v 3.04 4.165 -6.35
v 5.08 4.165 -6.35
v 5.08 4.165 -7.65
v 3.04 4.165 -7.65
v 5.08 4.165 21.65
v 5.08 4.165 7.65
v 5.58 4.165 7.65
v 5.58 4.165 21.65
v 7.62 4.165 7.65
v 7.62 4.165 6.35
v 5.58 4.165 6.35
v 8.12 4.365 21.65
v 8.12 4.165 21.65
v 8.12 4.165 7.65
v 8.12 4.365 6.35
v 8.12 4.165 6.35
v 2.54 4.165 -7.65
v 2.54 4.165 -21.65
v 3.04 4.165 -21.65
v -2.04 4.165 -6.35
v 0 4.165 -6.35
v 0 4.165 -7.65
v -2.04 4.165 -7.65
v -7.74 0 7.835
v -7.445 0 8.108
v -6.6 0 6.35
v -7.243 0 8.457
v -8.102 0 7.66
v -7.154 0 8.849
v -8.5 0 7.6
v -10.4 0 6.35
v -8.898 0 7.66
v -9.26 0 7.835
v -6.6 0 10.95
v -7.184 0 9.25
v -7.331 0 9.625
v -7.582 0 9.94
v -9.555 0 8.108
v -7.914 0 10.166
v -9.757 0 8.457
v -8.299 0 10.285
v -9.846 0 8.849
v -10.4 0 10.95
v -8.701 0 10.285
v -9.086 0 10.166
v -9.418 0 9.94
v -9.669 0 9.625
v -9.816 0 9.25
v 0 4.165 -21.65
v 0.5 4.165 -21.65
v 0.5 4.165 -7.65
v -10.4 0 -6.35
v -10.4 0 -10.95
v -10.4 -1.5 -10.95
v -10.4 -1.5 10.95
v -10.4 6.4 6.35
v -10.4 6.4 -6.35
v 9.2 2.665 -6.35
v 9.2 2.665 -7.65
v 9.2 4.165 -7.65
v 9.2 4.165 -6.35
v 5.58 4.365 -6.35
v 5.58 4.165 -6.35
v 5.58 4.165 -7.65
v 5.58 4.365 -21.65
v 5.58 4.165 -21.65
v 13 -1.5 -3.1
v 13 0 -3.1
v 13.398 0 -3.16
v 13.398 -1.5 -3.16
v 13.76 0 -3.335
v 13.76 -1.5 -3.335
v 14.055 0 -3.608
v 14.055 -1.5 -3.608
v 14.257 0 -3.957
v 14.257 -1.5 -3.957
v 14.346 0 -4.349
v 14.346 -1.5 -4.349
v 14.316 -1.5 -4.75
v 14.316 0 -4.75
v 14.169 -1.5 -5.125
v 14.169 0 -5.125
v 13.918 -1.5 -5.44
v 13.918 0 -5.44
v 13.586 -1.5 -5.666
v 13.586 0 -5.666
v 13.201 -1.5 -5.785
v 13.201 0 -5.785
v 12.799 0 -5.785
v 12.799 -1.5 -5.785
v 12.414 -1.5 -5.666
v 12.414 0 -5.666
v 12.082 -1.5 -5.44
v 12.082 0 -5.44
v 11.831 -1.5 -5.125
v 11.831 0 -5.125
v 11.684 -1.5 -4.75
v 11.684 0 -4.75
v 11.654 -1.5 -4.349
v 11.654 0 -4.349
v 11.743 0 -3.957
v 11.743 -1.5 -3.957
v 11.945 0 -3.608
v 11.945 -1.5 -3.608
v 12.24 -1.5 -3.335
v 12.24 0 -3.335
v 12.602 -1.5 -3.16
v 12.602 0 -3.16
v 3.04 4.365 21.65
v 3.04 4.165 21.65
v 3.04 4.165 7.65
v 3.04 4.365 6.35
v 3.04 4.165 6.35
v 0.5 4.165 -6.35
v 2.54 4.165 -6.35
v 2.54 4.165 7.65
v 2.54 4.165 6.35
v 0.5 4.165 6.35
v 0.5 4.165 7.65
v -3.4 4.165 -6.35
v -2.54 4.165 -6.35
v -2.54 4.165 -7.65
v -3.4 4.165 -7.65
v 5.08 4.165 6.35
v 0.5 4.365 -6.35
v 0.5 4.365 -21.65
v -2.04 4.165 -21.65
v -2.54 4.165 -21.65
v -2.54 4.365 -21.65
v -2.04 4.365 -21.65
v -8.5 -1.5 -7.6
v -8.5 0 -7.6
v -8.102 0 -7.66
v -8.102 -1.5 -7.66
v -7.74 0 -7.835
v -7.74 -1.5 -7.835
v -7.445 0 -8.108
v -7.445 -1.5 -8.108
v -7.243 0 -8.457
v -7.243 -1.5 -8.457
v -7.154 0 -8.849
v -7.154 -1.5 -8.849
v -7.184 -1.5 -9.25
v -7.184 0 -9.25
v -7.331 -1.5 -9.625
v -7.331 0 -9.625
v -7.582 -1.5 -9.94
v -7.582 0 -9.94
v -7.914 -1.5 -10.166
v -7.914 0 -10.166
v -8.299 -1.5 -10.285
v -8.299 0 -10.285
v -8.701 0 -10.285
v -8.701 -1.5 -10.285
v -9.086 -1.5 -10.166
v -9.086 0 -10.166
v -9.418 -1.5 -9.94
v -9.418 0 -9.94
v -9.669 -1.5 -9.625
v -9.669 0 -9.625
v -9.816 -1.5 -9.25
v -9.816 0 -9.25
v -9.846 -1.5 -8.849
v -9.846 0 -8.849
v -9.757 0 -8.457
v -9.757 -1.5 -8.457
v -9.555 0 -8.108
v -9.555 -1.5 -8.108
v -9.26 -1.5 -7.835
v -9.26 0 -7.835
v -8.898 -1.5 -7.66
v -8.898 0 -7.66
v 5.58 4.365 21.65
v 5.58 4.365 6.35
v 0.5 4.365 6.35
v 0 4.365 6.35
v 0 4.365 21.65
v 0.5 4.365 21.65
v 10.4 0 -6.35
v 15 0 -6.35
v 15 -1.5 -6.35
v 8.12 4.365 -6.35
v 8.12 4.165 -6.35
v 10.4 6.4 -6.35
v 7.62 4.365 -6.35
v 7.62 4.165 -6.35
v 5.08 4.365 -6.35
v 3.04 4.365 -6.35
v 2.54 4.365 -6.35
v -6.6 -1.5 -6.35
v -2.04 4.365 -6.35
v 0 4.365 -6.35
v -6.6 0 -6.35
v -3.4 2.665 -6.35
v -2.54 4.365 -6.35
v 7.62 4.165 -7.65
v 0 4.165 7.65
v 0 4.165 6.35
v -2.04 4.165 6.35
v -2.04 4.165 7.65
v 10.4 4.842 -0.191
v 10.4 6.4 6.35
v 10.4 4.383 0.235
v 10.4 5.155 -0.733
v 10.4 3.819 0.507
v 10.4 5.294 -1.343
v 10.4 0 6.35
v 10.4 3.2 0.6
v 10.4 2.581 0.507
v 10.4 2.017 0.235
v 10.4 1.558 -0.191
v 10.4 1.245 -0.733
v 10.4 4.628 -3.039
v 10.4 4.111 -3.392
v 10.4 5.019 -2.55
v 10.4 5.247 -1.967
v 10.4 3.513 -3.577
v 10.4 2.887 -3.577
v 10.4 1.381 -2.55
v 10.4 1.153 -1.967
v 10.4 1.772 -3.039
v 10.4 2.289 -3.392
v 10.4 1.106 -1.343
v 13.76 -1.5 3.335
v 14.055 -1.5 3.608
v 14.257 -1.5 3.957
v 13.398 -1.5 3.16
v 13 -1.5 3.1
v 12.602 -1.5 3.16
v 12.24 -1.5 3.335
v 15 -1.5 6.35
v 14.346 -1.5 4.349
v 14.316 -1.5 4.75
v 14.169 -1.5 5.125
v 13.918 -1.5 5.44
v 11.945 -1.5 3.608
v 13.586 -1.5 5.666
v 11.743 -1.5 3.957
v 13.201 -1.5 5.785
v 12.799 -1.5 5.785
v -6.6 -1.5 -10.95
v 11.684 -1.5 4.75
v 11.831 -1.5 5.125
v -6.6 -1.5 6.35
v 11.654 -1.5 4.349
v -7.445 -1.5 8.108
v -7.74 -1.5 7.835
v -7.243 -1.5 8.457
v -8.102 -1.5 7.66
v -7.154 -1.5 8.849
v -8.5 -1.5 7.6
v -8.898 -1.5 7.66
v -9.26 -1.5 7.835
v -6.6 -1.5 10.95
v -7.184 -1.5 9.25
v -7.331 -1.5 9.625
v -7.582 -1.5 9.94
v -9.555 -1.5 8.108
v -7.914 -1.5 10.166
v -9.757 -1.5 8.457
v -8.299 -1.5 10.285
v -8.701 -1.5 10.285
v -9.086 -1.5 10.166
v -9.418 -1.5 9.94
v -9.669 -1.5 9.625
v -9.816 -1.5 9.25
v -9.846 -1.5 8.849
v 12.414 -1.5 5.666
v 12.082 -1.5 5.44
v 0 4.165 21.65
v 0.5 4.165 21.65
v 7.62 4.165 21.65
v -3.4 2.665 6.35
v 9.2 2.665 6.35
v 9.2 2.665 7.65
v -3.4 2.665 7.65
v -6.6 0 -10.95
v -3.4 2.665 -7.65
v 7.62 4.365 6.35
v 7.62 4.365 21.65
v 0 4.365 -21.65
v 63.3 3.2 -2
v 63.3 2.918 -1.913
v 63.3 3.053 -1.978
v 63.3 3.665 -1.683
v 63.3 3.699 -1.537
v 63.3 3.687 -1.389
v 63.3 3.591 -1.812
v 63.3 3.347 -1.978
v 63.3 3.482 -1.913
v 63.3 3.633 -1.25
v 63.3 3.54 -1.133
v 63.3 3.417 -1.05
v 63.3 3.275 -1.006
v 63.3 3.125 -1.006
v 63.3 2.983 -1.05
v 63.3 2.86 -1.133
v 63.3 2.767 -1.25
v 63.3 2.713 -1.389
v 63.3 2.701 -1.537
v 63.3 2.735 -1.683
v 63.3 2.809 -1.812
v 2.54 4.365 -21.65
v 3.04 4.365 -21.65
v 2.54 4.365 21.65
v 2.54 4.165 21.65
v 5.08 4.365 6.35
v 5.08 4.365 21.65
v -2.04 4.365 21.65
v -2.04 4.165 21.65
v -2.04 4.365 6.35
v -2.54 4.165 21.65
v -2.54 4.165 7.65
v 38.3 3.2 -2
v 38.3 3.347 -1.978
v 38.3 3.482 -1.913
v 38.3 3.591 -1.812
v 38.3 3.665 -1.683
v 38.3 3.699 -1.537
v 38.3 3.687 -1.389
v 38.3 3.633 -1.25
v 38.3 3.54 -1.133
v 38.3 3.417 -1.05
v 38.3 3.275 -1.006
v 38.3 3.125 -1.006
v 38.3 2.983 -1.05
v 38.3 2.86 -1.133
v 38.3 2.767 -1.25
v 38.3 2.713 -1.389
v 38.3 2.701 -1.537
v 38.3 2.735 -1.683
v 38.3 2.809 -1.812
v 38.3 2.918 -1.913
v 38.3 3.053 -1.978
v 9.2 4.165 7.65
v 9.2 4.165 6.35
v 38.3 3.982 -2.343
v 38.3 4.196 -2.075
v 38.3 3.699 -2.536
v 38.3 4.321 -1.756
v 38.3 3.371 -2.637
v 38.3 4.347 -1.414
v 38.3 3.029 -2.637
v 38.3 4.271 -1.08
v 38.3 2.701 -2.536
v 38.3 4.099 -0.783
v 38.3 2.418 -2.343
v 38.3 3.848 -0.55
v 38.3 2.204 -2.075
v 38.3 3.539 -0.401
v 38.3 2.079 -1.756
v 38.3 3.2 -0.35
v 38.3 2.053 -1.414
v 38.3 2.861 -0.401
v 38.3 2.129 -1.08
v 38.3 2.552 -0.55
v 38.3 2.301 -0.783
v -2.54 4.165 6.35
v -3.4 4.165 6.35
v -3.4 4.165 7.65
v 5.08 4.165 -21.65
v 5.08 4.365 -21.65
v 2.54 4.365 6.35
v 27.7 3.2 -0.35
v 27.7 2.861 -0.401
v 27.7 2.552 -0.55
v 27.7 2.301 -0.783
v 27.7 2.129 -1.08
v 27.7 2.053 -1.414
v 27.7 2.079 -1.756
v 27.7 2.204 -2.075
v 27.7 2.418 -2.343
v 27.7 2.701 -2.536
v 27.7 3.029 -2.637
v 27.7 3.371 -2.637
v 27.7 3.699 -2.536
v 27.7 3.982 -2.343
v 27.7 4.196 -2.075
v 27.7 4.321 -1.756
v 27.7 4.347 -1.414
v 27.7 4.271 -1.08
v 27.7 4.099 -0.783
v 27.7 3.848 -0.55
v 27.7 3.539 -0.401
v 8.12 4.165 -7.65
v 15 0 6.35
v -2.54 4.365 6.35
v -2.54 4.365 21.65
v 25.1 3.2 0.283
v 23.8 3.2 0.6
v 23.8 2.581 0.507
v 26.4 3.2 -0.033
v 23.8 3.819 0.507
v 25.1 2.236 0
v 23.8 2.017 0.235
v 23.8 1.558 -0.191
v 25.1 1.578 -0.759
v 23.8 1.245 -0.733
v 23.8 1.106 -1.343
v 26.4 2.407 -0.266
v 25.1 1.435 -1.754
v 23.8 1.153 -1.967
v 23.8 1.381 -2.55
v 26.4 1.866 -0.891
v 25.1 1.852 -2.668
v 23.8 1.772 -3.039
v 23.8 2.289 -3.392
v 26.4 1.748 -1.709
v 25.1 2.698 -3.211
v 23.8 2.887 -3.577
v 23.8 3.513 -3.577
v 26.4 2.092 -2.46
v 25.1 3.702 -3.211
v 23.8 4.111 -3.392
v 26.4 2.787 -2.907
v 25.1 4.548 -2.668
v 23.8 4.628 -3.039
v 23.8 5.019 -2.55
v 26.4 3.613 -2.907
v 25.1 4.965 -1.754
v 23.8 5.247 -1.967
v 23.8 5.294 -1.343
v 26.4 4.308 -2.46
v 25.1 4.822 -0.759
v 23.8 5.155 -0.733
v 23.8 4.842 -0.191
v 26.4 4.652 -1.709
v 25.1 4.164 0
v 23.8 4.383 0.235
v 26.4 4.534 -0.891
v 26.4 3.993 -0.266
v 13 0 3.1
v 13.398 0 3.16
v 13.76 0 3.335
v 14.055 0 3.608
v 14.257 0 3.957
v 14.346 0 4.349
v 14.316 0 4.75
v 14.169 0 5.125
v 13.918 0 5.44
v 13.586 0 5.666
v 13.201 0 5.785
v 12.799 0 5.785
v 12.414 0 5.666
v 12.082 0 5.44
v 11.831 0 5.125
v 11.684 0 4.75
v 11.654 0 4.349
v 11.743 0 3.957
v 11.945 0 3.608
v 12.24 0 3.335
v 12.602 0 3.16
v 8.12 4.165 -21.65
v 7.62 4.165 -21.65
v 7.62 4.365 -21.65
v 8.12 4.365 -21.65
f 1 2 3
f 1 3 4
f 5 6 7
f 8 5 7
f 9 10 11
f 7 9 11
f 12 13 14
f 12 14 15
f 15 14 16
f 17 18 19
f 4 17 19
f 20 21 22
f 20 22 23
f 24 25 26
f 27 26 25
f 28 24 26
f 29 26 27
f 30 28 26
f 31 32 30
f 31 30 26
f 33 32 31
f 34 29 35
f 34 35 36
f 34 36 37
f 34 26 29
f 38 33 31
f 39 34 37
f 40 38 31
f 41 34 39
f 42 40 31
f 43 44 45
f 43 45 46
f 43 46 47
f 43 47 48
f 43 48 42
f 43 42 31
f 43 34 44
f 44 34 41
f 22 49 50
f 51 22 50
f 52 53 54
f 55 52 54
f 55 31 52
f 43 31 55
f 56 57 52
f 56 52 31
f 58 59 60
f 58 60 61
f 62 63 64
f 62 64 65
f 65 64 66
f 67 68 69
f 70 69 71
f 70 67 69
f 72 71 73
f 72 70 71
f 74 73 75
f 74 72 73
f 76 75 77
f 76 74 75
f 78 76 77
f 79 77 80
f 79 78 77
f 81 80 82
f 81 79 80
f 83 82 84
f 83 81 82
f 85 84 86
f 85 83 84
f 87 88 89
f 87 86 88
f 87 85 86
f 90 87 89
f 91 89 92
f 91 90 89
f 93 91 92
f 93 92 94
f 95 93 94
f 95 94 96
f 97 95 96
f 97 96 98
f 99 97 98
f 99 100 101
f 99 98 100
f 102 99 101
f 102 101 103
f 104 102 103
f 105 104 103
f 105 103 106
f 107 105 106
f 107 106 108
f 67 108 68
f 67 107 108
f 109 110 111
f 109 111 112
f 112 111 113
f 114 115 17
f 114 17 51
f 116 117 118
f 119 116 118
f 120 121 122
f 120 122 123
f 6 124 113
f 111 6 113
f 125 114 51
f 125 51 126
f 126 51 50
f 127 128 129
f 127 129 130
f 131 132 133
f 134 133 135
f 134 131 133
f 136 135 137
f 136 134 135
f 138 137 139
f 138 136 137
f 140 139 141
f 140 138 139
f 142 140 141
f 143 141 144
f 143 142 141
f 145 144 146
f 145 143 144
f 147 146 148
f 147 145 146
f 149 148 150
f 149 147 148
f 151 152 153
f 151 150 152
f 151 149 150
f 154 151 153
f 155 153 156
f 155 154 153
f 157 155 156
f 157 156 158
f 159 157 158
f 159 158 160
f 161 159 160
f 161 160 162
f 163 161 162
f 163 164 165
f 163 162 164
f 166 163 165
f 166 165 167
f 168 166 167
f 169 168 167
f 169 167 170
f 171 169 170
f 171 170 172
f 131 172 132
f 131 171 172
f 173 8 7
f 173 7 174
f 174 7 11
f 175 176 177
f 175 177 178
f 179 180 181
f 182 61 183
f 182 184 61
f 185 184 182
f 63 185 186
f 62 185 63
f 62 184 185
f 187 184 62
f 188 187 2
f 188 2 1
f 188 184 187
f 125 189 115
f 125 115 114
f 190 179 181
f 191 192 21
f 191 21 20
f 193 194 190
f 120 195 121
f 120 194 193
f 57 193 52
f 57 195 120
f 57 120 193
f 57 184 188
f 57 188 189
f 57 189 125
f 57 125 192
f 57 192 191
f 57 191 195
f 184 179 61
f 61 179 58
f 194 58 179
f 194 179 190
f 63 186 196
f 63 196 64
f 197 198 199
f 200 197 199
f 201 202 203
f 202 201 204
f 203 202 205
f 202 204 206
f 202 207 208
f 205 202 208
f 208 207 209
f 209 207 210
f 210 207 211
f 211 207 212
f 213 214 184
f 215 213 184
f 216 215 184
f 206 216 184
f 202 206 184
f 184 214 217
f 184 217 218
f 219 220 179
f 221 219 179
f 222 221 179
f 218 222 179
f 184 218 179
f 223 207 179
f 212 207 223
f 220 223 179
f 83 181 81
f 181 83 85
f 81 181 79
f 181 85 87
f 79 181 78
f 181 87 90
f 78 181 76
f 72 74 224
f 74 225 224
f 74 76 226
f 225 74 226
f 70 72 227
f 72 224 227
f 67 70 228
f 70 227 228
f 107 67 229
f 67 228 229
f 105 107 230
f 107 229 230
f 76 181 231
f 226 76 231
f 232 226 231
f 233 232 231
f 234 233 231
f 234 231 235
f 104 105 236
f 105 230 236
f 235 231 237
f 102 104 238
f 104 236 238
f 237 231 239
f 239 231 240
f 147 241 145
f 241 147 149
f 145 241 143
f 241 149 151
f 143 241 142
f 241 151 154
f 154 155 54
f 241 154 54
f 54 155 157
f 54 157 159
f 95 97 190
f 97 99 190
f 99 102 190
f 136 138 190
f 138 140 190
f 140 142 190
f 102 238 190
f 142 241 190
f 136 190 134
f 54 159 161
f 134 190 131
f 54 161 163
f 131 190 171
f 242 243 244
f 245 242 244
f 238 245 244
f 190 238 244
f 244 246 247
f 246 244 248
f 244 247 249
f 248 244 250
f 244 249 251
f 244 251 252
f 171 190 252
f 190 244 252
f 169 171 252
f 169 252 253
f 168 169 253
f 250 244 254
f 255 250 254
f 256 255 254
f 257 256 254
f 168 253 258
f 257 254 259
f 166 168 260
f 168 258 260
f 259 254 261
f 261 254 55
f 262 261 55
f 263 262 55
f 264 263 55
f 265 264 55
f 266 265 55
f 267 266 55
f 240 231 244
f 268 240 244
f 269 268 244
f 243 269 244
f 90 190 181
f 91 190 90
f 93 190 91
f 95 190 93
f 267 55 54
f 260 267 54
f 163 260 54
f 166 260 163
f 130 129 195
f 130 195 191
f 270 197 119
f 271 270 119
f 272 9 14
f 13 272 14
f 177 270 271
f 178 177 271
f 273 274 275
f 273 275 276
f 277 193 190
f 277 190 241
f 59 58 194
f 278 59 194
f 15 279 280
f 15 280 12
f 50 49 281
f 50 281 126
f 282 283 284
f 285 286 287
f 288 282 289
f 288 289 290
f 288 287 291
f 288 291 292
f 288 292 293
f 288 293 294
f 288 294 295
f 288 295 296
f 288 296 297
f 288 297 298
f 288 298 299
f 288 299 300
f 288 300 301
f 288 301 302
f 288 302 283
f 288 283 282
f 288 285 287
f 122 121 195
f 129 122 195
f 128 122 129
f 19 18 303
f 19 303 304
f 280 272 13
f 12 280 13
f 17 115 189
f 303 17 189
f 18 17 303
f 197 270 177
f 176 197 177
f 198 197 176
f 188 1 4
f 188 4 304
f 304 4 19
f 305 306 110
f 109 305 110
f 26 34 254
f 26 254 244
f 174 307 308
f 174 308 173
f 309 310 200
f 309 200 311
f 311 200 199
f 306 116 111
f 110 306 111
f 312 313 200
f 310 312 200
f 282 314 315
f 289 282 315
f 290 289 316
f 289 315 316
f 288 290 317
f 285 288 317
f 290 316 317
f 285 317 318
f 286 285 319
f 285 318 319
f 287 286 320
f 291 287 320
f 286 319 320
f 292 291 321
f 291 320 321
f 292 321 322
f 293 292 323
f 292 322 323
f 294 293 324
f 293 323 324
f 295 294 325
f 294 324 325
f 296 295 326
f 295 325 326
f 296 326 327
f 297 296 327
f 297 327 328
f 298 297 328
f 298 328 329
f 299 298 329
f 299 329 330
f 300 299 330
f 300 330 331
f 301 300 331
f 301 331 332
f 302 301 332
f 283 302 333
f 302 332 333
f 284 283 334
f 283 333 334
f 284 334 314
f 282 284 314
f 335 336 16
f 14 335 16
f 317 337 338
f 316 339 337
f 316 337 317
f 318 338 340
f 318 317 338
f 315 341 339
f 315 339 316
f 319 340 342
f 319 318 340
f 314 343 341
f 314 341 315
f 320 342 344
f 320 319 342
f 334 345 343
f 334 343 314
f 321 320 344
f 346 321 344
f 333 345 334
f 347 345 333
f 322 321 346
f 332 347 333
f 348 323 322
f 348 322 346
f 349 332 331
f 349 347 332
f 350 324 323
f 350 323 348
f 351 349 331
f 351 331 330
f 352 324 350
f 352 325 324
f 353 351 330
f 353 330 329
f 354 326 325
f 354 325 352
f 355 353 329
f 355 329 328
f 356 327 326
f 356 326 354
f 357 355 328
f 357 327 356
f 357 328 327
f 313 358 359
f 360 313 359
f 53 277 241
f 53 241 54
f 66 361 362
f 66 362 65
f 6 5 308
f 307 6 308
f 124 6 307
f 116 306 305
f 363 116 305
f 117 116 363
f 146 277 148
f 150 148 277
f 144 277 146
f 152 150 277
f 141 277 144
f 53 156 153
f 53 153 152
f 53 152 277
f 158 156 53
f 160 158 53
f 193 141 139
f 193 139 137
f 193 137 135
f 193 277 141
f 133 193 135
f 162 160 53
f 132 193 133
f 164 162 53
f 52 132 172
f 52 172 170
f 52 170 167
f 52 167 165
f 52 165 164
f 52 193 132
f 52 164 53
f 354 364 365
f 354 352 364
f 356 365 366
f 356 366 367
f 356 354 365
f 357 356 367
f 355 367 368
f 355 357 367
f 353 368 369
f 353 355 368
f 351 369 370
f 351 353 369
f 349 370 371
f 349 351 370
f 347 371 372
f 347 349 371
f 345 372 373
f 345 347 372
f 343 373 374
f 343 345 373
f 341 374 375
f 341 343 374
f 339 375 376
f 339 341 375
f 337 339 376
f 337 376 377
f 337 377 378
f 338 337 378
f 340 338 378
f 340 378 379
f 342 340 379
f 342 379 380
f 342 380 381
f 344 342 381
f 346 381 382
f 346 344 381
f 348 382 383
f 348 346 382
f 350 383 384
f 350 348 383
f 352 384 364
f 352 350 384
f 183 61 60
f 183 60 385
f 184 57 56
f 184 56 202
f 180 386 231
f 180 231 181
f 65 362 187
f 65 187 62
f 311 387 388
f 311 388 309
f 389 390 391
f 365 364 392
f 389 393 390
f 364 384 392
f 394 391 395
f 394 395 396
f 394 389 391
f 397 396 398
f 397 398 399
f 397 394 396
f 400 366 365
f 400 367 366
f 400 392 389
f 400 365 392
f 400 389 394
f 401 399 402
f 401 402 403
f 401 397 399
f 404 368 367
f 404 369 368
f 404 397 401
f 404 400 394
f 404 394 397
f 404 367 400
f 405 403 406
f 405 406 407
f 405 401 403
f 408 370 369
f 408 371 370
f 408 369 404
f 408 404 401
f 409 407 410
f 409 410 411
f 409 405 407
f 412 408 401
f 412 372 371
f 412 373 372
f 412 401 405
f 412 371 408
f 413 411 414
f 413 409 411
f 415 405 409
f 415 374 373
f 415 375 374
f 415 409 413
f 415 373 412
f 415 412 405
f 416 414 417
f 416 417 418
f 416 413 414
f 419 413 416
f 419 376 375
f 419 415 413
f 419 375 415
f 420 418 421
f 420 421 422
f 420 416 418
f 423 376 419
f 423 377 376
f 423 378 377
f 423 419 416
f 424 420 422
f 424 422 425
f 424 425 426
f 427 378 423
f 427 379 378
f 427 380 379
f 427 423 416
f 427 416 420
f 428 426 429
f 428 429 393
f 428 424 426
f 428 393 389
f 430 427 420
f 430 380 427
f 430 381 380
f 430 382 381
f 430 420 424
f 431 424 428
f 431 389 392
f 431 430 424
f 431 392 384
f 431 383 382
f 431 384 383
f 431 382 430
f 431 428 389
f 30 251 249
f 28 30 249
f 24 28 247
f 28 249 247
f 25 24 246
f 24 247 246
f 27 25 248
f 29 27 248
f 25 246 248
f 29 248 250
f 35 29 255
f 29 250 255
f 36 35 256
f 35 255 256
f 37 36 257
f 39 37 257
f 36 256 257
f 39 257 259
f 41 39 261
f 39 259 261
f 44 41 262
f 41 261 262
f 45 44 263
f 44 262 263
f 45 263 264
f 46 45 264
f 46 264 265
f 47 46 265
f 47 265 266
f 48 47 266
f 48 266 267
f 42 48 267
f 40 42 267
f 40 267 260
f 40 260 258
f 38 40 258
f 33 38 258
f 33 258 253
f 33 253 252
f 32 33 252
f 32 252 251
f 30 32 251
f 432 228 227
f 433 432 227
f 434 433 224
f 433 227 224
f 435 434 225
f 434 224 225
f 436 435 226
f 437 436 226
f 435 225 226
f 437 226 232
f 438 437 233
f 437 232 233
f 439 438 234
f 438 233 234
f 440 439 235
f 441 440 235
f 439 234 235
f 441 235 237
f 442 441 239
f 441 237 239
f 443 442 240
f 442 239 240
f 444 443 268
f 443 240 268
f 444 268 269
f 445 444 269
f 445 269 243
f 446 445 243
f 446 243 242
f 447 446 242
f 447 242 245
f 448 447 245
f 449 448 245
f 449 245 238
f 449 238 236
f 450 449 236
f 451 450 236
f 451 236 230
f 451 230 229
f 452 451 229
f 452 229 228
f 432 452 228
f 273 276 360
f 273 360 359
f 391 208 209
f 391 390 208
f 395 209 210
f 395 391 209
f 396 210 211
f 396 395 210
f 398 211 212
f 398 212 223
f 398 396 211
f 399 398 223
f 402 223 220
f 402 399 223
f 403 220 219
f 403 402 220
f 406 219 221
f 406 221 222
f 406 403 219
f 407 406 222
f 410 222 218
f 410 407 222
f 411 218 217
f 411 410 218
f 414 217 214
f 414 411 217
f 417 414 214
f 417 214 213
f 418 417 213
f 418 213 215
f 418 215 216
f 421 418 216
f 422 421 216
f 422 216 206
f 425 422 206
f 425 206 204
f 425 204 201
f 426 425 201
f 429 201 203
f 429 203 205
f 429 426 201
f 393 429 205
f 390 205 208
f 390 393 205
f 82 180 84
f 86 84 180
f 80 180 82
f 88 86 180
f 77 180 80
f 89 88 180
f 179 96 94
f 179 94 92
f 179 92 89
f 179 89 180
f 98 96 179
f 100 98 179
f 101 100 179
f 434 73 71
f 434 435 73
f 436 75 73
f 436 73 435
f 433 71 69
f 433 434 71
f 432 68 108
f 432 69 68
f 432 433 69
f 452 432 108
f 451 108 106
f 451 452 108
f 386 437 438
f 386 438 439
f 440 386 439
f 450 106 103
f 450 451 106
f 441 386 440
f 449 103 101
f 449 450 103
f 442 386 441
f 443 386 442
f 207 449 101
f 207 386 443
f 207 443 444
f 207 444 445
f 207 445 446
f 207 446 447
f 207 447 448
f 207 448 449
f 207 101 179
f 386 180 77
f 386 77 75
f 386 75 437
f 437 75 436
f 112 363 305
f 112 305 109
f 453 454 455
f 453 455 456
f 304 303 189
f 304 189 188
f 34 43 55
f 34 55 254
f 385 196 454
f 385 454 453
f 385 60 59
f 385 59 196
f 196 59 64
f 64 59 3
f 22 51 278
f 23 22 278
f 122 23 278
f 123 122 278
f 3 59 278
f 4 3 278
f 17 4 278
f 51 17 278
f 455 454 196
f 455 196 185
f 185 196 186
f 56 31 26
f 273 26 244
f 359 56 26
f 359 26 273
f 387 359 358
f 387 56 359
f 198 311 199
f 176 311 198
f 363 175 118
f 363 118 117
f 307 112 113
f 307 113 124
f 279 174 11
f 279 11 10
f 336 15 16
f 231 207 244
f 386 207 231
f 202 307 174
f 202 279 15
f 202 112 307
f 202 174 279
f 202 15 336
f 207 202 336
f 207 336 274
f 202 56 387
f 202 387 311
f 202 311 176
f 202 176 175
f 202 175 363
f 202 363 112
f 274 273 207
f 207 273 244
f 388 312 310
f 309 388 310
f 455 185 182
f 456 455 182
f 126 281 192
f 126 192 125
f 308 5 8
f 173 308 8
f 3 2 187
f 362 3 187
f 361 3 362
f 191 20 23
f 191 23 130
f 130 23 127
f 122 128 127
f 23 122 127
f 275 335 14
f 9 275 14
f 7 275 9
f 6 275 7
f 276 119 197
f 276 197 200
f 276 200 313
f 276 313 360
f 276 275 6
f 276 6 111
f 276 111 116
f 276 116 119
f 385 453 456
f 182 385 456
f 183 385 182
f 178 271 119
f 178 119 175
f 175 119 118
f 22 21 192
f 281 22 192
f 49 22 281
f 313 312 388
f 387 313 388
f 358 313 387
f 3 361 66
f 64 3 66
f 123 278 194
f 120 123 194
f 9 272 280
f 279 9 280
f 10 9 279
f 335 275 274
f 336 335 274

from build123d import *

# Parameters (mm, degrees)
SKETCH1_W               = 20.8
SKETCH1_H               = 12.7
BOSS_EXTRUDE1_DEPTH     = 6.4
BOSS_EXTRUDE2_DEPTH     = 1.5
SKETCH5_R               = 1.35
CUT_EXTRUDE1_DEPTH      = 21.181984541
SKETCH9_W               = 12.6
SKETCH9_H               = 1.3
BOSS_EXTRUDE4_DEPTH     = 1.5
SKETCH10_W              = 0.5
SKETCH10_H              = 15.3
BOSS_EXTRUDE5_DEPTH     = 0.2
LPATTERN1_COUNT         = 5
LPATTERN1_PITCH         = 2.54
MIRROR2_COPY_1_SKETCH_W = 0.5
MIRROR2_COPY_1_SKETCH_H = 15.3
MIRROR2_COPY_1_DEPTH    = 0.2
MIRROR2_COPY_2_SKETCH_W = 0.5
MIRROR2_COPY_2_SKETCH_H = 15.3
MIRROR2_COPY_2_DEPTH    = 0.2
MIRROR2_COPY_3_SKETCH_W = 0.5
MIRROR2_COPY_3_SKETCH_H = 15.3
MIRROR2_COPY_3_DEPTH    = 0.2
MIRROR2_COPY_4_SKETCH_W = 0.5
MIRROR2_COPY_4_SKETCH_H = 15.3
MIRROR2_COPY_4_DEPTH    = 0.2
SKETCH12_R              = 0.5
BOSS_EXTRUDE6_DEPTH     = 25


with BuildPart() as part:
    # Sketch1 → Boss-Extrude1 (new body)
    with BuildSketch(Plane(origin=(0, 0, 0), x_dir=(1, 0, 0), z_dir=(0, 1, 0))):
        Rectangle(SKETCH1_W, SKETCH1_H)
    extrude(amount=BOSS_EXTRUDE1_DEPTH)

    # Sketch3 → Boss-Extrude2 (add)
    with BuildSketch(Plane.XZ):
        Polygon((-10.4, 10.95), (-6.6, 10.95), (-6.6, 6.35), (15, 6.35), (15, -6.35), (-6.6, -6.35), (-6.6, -10.95), (-10.4, -10.95), align=None)
    extrude(amount=BOSS_EXTRUDE2_DEPTH)

    # Sketch5 → Cut-Extrude1 (cut, through all)
    with BuildSketch(Plane.XZ.offset(1.5)):
        with Locations((-8.5, 8.95)):
            Circle(SKETCH5_R)
        with Locations((13, 4.45)):
            Circle(SKETCH5_R)
    cut_extrude1 = extrude(amount=-CUT_EXTRUDE1_DEPTH, mode=Mode.SUBTRACT)

    # Mirror3: Cut-Extrude1 across plane
    add(cut_extrude1.mirror(Plane.XY), mode=Mode.SUBTRACT)

    # Sketch11 → Revolve1 (revolve)
    with BuildSketch(Plane(origin=(0, 3.2, 0), x_dir=(-1, 0, 0), z_dir=(0, -1, 0))):
        Polygon((-10.4, 1.5), (-10.4, 3.6), (-23.8, 3.6), (-27.7, 2.65), (-38.3, 2.65), (-38.3, 1.5), align=None)
    revolve(axis=Axis((10.4, 3.2, -1.5), (1, 0, 0)))

    # Sketch9 → Boss-Extrude4 (add)
    with BuildSketch(Plane(origin=(0, 2.665, 0), x_dir=(-1, 0, 0), z_dir=(0, -1, 0))):
        with Locations((-2.9, -7)):
            Rectangle(SKETCH9_W, SKETCH9_H)
    boss_extrude4 = extrude(amount=-BOSS_EXTRUDE4_DEPTH)

    # Sketch10 → Boss-Extrude5 (add)
    with BuildSketch(Plane(origin=(0, 4.165, 0), x_dir=(1, 0, 0), z_dir=(0, 1, 0))):
        with Locations((7.87, -14)):
            Rectangle(SKETCH10_W, SKETCH10_H)
    boss_extrude5 = extrude(amount=BOSS_EXTRUDE5_DEPTH)

    # LPattern1: Boss-Extrude5 ×5
    with Locations(*[(-i * LPATTERN1_PITCH, 0, 0) for i in range(1, LPATTERN1_COUNT)]):
        add(boss_extrude5)

    # Mirror2: Boss-Extrude4, Boss-Extrude5 across plane
    add(boss_extrude4.mirror(Plane.XY))
    add(boss_extrude5.mirror(Plane.XY))

    # Mirror2 copy 1 sketch → Mirror2 copy 1 (add)
    with BuildSketch(Plane(origin=(-2.54, 4.165, 0), x_dir=(1, 0, 0), z_dir=(0, 1, 0))):
        with Locations((7.87, 14)):
            Rectangle(MIRROR2_COPY_1_SKETCH_W, MIRROR2_COPY_1_SKETCH_H)
    extrude(amount=MIRROR2_COPY_1_DEPTH)

    # Mirror2 copy 2 sketch → Mirror2 copy 2 (add)
    with BuildSketch(Plane(origin=(-5.08, 4.165, 0), x_dir=(1, 0, 0), z_dir=(0, 1, 0))):
        with Locations((7.87, 14)):
            Rectangle(MIRROR2_COPY_2_SKETCH_W, MIRROR2_COPY_2_SKETCH_H)
    extrude(amount=MIRROR2_COPY_2_DEPTH)

    # Mirror2 copy 3 sketch → Mirror2 copy 3 (add)
    with BuildSketch(Plane(origin=(-7.62, 4.165, 0), x_dir=(1, 0, 0), z_dir=(0, 1, 0))):
        with Locations((7.87, 14)):
            Rectangle(MIRROR2_COPY_3_SKETCH_W, MIRROR2_COPY_3_SKETCH_H)
    extrude(amount=MIRROR2_COPY_3_DEPTH)

    # Mirror2 copy 4 sketch → Mirror2 copy 4 (add)
    with BuildSketch(Plane(origin=(-10.16, 4.165, 0), x_dir=(1, 0, 0), z_dir=(0, 1, 0))):
        with Locations((7.87, 14)):
            Rectangle(MIRROR2_COPY_4_SKETCH_W, MIRROR2_COPY_4_SKETCH_H)
    extrude(amount=MIRROR2_COPY_4_DEPTH)

    # Sketch12 → Boss-Extrude6 (add)
    with BuildSketch(Plane(origin=(38.3, 0, 0), x_dir=(0, 0, -1), z_dir=(1, 0, 0))):
        with Locations((1.5, 3.2)):
            Circle(SKETCH12_R)
    extrude(amount=BOSS_EXTRUDE6_DEPTH)


solid = part.part
